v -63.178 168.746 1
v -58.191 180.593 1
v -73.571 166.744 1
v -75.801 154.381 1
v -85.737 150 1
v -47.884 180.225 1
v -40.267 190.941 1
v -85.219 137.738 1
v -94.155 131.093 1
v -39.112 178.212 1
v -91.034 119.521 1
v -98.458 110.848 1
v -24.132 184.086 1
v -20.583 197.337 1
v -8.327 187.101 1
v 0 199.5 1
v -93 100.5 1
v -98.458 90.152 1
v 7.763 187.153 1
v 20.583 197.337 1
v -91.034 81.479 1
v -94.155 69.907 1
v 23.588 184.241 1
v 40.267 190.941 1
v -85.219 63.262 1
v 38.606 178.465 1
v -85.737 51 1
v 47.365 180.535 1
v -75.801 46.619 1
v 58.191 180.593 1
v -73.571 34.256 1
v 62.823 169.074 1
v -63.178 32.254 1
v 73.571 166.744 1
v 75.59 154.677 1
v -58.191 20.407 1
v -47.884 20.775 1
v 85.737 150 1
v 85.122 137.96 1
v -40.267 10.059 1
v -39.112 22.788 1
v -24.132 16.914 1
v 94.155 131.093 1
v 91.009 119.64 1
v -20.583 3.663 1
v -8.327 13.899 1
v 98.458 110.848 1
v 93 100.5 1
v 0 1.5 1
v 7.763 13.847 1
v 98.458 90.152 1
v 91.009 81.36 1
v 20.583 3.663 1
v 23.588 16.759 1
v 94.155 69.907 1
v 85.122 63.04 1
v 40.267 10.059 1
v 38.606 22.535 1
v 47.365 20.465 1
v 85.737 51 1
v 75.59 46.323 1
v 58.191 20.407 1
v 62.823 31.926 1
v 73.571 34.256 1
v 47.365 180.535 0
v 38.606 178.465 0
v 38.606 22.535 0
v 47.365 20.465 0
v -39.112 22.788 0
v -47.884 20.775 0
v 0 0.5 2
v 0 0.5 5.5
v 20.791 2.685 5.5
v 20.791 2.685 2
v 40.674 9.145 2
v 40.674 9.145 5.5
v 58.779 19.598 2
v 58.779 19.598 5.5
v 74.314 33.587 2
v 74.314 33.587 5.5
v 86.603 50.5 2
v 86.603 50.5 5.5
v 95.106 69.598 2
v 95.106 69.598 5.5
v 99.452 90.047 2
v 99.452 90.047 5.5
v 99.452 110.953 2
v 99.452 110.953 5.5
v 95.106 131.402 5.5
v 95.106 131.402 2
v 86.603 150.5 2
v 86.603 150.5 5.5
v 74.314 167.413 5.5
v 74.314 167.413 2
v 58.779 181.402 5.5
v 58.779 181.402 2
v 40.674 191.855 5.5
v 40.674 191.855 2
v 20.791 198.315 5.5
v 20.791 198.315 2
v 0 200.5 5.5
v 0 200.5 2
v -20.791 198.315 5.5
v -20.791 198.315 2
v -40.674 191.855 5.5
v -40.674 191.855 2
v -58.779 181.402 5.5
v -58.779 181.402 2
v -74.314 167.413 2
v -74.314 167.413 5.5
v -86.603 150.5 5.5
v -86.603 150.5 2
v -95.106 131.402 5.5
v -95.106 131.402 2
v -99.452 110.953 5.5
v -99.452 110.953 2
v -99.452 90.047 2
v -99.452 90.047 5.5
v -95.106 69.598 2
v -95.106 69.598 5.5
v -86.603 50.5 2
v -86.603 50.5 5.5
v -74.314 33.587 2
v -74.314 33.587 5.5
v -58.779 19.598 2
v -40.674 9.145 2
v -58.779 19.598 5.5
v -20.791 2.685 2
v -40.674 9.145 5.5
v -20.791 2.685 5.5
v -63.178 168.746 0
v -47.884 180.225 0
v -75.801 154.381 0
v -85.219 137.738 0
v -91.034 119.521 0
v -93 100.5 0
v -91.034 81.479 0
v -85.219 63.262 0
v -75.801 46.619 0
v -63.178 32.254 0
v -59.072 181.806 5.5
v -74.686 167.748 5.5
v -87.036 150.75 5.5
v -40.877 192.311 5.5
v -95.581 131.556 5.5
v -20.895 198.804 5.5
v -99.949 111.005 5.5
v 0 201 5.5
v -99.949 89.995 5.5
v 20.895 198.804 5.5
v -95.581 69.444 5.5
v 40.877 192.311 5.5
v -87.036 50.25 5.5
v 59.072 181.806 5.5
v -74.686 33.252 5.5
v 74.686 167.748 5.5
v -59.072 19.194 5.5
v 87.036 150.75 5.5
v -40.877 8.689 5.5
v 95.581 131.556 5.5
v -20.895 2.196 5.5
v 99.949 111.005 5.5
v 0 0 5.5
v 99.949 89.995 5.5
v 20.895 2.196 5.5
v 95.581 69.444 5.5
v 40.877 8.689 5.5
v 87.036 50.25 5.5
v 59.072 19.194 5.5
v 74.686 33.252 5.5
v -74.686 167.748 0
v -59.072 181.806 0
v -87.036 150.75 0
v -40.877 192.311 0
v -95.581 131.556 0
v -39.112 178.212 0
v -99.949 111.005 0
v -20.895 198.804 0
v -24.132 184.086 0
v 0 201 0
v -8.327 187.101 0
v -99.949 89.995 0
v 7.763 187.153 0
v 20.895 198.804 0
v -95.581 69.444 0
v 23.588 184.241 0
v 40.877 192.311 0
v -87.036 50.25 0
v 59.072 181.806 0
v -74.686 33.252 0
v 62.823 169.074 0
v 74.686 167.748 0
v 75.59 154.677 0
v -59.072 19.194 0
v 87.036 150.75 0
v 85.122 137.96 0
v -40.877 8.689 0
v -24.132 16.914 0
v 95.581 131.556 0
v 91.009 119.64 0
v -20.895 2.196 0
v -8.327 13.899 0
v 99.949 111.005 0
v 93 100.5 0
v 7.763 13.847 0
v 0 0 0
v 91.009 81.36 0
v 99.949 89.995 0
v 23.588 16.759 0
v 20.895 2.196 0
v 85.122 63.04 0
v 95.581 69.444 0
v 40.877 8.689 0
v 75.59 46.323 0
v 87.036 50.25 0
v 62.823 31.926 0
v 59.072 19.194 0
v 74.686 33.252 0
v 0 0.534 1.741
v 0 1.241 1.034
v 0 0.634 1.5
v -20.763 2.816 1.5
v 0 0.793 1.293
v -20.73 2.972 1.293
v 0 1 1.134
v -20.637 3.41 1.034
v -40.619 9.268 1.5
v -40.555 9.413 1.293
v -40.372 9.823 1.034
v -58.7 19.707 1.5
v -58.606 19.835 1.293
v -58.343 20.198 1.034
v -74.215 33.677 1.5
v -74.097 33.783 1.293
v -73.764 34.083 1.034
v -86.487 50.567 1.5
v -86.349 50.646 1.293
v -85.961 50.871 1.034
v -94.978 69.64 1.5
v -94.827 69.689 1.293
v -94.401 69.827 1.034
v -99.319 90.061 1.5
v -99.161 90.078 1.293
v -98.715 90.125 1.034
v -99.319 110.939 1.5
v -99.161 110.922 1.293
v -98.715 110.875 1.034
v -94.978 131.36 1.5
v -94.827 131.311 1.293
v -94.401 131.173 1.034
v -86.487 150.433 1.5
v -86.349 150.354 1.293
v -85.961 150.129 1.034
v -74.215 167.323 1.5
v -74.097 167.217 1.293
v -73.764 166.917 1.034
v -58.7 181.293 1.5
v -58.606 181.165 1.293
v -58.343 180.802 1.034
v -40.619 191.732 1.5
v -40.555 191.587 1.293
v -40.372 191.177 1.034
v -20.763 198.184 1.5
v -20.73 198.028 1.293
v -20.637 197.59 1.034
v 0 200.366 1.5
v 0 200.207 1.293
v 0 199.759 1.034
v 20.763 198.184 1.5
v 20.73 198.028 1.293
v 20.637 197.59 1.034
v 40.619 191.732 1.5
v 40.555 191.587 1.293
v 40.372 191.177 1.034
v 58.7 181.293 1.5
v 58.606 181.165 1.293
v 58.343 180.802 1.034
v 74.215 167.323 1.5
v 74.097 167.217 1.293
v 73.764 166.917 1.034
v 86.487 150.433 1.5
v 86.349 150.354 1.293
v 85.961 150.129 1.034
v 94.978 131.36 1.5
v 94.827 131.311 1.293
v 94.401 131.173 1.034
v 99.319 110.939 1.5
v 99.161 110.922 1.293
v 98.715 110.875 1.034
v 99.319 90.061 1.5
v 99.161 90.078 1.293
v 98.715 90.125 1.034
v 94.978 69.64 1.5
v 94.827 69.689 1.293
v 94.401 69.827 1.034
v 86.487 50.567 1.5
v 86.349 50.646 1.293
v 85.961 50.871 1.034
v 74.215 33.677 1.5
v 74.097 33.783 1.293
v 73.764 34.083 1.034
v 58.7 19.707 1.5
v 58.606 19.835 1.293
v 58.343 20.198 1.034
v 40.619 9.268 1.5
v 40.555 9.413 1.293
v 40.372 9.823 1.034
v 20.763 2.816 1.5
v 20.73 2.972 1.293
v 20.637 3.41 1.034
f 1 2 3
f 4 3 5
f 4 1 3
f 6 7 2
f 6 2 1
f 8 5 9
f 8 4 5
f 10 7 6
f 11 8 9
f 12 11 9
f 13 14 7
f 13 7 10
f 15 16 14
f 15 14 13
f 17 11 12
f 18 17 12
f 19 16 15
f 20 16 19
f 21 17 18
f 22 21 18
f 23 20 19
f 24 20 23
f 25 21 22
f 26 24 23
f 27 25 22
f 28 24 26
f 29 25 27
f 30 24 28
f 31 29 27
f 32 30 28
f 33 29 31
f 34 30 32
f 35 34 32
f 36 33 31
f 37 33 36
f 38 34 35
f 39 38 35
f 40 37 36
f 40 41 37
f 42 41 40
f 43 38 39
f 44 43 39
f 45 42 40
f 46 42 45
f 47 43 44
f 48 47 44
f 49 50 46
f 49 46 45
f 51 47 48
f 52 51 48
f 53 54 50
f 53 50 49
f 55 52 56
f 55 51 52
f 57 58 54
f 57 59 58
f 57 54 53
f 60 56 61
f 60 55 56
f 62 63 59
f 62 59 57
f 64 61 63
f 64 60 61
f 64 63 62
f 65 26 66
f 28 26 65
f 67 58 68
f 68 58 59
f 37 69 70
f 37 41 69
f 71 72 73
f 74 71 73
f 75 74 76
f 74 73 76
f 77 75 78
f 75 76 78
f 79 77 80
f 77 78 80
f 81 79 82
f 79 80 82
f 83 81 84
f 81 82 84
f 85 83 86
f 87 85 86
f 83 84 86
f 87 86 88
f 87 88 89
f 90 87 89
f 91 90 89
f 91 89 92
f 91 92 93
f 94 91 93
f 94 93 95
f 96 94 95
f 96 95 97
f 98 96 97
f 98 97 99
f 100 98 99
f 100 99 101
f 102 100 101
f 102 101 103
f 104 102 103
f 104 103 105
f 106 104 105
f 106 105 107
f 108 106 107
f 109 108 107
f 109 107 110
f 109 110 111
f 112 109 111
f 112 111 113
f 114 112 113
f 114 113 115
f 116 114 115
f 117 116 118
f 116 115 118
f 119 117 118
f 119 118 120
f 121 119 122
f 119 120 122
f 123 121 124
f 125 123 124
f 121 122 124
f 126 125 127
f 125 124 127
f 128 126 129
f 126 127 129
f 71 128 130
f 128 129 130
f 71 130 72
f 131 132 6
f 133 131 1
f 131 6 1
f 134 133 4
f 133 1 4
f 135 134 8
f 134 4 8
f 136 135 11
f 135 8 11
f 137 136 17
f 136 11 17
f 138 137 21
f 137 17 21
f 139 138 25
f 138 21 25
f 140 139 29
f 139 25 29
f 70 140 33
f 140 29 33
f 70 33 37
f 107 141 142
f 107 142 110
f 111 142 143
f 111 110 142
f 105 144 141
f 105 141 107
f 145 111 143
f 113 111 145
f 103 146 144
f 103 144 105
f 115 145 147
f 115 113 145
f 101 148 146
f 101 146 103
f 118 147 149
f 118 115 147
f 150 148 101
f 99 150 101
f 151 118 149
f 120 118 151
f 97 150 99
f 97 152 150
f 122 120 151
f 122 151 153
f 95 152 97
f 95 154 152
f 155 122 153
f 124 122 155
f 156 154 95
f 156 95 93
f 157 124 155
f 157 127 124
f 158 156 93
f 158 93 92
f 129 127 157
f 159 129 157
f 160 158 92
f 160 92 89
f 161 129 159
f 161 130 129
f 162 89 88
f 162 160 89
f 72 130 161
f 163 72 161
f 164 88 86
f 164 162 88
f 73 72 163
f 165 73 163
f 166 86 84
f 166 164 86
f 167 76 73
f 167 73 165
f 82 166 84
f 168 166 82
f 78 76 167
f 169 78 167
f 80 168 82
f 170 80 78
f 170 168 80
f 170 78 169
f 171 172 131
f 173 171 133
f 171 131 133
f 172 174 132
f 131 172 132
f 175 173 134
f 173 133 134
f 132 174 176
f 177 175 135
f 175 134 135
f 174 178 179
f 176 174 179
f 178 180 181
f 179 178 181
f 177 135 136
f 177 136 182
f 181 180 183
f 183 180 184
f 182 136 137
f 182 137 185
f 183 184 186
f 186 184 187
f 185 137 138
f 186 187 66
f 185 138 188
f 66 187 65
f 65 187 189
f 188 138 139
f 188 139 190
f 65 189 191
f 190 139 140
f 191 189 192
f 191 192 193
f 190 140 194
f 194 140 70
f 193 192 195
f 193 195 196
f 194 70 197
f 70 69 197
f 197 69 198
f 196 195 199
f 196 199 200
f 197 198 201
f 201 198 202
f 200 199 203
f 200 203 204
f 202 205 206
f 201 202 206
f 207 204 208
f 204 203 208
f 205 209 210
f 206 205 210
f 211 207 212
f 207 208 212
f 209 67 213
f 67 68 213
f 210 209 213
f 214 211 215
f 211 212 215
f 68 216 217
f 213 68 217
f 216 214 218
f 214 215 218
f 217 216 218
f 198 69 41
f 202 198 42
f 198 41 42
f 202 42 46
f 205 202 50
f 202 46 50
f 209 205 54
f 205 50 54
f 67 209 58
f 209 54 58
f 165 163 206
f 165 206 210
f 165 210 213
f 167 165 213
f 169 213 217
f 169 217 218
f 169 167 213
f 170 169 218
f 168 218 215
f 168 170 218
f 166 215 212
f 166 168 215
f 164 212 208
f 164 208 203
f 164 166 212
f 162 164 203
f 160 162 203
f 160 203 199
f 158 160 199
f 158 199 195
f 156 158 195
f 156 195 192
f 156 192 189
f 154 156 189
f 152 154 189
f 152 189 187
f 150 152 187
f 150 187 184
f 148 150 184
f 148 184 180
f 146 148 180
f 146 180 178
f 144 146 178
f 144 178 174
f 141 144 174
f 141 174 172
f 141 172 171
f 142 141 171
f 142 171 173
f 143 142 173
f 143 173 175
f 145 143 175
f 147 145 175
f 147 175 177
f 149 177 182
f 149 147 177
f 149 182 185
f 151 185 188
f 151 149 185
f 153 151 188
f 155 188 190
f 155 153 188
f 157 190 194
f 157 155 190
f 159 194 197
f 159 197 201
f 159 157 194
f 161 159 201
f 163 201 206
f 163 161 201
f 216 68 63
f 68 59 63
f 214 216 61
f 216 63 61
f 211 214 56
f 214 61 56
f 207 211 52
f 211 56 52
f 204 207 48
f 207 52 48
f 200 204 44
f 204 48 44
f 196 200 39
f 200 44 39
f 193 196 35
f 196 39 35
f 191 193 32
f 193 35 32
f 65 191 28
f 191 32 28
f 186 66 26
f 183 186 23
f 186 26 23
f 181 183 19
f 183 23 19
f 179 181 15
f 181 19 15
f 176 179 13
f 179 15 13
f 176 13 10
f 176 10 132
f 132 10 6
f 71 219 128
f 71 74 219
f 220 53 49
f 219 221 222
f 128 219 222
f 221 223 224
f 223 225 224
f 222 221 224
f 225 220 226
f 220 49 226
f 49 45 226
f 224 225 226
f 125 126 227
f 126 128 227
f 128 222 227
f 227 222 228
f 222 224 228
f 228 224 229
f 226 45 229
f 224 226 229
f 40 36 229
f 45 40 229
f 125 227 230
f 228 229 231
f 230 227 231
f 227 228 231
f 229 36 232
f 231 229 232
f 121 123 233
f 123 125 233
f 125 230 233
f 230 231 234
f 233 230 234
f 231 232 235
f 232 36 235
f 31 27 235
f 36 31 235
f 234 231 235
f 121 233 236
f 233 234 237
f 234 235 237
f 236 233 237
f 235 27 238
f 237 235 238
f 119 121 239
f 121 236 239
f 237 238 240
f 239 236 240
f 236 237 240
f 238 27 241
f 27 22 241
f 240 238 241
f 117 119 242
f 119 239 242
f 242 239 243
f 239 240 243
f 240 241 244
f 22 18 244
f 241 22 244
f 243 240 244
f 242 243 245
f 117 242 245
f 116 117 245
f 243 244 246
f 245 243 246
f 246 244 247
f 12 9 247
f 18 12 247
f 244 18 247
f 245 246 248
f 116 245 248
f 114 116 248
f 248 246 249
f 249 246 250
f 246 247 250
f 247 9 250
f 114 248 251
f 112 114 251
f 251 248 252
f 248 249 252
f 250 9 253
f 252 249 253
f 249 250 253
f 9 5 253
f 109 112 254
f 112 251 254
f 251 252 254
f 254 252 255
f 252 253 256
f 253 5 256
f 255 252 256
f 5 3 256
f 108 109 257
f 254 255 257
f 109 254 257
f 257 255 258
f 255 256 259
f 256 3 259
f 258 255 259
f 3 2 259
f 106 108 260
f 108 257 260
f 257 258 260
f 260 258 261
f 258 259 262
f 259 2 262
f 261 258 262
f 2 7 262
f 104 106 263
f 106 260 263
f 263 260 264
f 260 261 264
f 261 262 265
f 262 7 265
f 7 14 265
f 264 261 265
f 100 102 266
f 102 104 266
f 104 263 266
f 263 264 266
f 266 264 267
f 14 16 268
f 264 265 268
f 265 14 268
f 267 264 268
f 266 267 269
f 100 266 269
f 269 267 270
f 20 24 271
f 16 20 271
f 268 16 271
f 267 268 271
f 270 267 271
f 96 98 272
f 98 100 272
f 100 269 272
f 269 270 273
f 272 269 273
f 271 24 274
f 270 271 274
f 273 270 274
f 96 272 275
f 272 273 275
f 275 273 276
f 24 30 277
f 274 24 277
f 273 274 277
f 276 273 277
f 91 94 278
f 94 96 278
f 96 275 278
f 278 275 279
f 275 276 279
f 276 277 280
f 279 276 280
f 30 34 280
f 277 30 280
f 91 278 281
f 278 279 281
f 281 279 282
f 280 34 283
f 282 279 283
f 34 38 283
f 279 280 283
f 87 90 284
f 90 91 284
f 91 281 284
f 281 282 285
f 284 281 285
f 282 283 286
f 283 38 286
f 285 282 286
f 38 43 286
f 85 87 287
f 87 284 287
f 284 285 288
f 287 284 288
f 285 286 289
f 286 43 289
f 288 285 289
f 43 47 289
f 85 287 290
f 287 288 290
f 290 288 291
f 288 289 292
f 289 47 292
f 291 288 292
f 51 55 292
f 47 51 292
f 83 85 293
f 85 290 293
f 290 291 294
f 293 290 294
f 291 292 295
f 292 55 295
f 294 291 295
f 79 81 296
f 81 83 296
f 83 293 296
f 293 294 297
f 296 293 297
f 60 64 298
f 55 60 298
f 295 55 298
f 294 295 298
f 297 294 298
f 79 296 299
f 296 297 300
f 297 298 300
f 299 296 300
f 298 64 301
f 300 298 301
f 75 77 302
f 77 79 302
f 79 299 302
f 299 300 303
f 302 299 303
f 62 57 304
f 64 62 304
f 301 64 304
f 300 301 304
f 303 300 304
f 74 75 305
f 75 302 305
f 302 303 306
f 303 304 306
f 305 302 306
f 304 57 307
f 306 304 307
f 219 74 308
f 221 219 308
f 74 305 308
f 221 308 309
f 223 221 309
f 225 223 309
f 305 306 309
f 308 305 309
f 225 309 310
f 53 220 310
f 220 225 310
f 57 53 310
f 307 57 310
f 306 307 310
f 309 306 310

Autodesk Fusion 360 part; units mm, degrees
sketch "Ring" plane through (0, 0, 0) normal (1, 0, 0) x (0, 1, 0)
  line L0 (0, 0) -> (0, 5.5)
  line L1 (0, 0) -> (13.5, 0)
  line L2 (13.5, 0) -> (13.5, 1)
  line L3 (13.5, 1) -> (0.5, 1)
  line L4 (0.5, 1) -> (0.5, 4)
  line L5 (0.5, 4) -> (0.5, 4.5)
  line L6 (0.5, 4.5) -> (0.5, 5.5)
  line L7 (0, 5.5) -> (0.5, 5.5)
  line L8 (100.5, -11) -> (100.5, 21) construction
  point P0 (100.5, 0)
  dimension "d11" = 1
  dimension "d12" = 3
  dimension "d13" = 1
  dimension "d21" = 0.5
  dimension "d47" = 13
  dimension "d48" = 100
  dimension "d55" = 0.5
  dimension "d56" = 0.5
revolve "Revolve Ring" add sketch "Ring" angle 360 about axis through (0, 100.5, -11) along (0, 0, 1)
sketch "Cutout" plane through (0, 0, 1) normal (0, 0, 1) x (-1, 0, 0)
  circle A0 centre (0, -100.5) radius 100
  circle A1 centre (0, -100.5) radius 87
  circle A2 centre (0, -100.5) radius 87
  circle A3 centre (0, -100.5) radius 93
  line L0 (39.1124, -22.7876) -> (47.8845, -20.775)
  line L1 (-38.6062, -22.5349) -> (-47.365, -20.4653)
  line L2 (-38.6062, -178.4651) -> (-47.365, -180.5347)
  line L3 (39.1124, -178.2124) -> (47.8845, -180.225)
  line L4 (47.8845, -180.225) -> (47.8845, -20.775) construction
  line L5 (-47.365, -180.5347) -> (-47.365, -20.4653) construction
  point P0 (39.1124, -22.7876)
  dimension "d24" = 0
  dimension "d25" = 186
  dimension "d37" = 9
  dimension "d49" = 95.25
  dimension "d50" = 77.719
  dimension "d52" = 159.45
extrude "Remove Cutout" cut sketch "Cutout" against normal blind 10 contours A1 A2 A3 L0 L3 | A1 A2 A3 L1 L2
fillet "Fillet2" radius 1 1 edges at (-93.2327, 64.3385, 1)
equation "d11 = bottom_thickness"
equation "d12 = cardboard_thickness"
equation "d21 = edge_thickness"
equation "d25 = spool_diameter - ( 2 * width_to_holes )"
equation "bottom_thickness = 1 mm" comment "Thickness of the part that touches the spool on the side."
equation "cardboard_thickness = 3 mm" comment "Thickness of the cardboard on the spool."
equation "spool_diameter = 200 mm" comment "Diameter of the spool."
equation "edge_thickness = 0.5 mm" comment "Thickness of the part that goes around the edge of the cardboard spool and sits on the rollers in the AMS, adding to the diameter of the spool.  Decrease this if the AMS cannot be closed as the diameter is too big.  For example: If the spool diameter is 200 mm and this value is 1 mm, the final diameter of the printed spool ring will be 200 mm + (2 * 1 mm) = 202 mm (as there is material on both sides)."
equation "width_to_holes = 7 mm" comment "Width between the edge of the cardboard spool and right before the holes start (which you use to stick the loose end of the filement in for storage). Decrease this if the printed part covers holes on the cardboard spool."
equation "total_width = 13 mm" comment "Width of the printed part that covers the cardboard spool's side (one side only). Must be larger than or equal to \"width_to_holes\"."
equation "d47 = total_width"
equation "d48 = spool_diameter / 2"
equation "d55 = edge_thickness"
equation "fillet_radius = 1 mm" comment "Size of the internal fillet, to increase strength in case the layers separate when taking it off the bed."
